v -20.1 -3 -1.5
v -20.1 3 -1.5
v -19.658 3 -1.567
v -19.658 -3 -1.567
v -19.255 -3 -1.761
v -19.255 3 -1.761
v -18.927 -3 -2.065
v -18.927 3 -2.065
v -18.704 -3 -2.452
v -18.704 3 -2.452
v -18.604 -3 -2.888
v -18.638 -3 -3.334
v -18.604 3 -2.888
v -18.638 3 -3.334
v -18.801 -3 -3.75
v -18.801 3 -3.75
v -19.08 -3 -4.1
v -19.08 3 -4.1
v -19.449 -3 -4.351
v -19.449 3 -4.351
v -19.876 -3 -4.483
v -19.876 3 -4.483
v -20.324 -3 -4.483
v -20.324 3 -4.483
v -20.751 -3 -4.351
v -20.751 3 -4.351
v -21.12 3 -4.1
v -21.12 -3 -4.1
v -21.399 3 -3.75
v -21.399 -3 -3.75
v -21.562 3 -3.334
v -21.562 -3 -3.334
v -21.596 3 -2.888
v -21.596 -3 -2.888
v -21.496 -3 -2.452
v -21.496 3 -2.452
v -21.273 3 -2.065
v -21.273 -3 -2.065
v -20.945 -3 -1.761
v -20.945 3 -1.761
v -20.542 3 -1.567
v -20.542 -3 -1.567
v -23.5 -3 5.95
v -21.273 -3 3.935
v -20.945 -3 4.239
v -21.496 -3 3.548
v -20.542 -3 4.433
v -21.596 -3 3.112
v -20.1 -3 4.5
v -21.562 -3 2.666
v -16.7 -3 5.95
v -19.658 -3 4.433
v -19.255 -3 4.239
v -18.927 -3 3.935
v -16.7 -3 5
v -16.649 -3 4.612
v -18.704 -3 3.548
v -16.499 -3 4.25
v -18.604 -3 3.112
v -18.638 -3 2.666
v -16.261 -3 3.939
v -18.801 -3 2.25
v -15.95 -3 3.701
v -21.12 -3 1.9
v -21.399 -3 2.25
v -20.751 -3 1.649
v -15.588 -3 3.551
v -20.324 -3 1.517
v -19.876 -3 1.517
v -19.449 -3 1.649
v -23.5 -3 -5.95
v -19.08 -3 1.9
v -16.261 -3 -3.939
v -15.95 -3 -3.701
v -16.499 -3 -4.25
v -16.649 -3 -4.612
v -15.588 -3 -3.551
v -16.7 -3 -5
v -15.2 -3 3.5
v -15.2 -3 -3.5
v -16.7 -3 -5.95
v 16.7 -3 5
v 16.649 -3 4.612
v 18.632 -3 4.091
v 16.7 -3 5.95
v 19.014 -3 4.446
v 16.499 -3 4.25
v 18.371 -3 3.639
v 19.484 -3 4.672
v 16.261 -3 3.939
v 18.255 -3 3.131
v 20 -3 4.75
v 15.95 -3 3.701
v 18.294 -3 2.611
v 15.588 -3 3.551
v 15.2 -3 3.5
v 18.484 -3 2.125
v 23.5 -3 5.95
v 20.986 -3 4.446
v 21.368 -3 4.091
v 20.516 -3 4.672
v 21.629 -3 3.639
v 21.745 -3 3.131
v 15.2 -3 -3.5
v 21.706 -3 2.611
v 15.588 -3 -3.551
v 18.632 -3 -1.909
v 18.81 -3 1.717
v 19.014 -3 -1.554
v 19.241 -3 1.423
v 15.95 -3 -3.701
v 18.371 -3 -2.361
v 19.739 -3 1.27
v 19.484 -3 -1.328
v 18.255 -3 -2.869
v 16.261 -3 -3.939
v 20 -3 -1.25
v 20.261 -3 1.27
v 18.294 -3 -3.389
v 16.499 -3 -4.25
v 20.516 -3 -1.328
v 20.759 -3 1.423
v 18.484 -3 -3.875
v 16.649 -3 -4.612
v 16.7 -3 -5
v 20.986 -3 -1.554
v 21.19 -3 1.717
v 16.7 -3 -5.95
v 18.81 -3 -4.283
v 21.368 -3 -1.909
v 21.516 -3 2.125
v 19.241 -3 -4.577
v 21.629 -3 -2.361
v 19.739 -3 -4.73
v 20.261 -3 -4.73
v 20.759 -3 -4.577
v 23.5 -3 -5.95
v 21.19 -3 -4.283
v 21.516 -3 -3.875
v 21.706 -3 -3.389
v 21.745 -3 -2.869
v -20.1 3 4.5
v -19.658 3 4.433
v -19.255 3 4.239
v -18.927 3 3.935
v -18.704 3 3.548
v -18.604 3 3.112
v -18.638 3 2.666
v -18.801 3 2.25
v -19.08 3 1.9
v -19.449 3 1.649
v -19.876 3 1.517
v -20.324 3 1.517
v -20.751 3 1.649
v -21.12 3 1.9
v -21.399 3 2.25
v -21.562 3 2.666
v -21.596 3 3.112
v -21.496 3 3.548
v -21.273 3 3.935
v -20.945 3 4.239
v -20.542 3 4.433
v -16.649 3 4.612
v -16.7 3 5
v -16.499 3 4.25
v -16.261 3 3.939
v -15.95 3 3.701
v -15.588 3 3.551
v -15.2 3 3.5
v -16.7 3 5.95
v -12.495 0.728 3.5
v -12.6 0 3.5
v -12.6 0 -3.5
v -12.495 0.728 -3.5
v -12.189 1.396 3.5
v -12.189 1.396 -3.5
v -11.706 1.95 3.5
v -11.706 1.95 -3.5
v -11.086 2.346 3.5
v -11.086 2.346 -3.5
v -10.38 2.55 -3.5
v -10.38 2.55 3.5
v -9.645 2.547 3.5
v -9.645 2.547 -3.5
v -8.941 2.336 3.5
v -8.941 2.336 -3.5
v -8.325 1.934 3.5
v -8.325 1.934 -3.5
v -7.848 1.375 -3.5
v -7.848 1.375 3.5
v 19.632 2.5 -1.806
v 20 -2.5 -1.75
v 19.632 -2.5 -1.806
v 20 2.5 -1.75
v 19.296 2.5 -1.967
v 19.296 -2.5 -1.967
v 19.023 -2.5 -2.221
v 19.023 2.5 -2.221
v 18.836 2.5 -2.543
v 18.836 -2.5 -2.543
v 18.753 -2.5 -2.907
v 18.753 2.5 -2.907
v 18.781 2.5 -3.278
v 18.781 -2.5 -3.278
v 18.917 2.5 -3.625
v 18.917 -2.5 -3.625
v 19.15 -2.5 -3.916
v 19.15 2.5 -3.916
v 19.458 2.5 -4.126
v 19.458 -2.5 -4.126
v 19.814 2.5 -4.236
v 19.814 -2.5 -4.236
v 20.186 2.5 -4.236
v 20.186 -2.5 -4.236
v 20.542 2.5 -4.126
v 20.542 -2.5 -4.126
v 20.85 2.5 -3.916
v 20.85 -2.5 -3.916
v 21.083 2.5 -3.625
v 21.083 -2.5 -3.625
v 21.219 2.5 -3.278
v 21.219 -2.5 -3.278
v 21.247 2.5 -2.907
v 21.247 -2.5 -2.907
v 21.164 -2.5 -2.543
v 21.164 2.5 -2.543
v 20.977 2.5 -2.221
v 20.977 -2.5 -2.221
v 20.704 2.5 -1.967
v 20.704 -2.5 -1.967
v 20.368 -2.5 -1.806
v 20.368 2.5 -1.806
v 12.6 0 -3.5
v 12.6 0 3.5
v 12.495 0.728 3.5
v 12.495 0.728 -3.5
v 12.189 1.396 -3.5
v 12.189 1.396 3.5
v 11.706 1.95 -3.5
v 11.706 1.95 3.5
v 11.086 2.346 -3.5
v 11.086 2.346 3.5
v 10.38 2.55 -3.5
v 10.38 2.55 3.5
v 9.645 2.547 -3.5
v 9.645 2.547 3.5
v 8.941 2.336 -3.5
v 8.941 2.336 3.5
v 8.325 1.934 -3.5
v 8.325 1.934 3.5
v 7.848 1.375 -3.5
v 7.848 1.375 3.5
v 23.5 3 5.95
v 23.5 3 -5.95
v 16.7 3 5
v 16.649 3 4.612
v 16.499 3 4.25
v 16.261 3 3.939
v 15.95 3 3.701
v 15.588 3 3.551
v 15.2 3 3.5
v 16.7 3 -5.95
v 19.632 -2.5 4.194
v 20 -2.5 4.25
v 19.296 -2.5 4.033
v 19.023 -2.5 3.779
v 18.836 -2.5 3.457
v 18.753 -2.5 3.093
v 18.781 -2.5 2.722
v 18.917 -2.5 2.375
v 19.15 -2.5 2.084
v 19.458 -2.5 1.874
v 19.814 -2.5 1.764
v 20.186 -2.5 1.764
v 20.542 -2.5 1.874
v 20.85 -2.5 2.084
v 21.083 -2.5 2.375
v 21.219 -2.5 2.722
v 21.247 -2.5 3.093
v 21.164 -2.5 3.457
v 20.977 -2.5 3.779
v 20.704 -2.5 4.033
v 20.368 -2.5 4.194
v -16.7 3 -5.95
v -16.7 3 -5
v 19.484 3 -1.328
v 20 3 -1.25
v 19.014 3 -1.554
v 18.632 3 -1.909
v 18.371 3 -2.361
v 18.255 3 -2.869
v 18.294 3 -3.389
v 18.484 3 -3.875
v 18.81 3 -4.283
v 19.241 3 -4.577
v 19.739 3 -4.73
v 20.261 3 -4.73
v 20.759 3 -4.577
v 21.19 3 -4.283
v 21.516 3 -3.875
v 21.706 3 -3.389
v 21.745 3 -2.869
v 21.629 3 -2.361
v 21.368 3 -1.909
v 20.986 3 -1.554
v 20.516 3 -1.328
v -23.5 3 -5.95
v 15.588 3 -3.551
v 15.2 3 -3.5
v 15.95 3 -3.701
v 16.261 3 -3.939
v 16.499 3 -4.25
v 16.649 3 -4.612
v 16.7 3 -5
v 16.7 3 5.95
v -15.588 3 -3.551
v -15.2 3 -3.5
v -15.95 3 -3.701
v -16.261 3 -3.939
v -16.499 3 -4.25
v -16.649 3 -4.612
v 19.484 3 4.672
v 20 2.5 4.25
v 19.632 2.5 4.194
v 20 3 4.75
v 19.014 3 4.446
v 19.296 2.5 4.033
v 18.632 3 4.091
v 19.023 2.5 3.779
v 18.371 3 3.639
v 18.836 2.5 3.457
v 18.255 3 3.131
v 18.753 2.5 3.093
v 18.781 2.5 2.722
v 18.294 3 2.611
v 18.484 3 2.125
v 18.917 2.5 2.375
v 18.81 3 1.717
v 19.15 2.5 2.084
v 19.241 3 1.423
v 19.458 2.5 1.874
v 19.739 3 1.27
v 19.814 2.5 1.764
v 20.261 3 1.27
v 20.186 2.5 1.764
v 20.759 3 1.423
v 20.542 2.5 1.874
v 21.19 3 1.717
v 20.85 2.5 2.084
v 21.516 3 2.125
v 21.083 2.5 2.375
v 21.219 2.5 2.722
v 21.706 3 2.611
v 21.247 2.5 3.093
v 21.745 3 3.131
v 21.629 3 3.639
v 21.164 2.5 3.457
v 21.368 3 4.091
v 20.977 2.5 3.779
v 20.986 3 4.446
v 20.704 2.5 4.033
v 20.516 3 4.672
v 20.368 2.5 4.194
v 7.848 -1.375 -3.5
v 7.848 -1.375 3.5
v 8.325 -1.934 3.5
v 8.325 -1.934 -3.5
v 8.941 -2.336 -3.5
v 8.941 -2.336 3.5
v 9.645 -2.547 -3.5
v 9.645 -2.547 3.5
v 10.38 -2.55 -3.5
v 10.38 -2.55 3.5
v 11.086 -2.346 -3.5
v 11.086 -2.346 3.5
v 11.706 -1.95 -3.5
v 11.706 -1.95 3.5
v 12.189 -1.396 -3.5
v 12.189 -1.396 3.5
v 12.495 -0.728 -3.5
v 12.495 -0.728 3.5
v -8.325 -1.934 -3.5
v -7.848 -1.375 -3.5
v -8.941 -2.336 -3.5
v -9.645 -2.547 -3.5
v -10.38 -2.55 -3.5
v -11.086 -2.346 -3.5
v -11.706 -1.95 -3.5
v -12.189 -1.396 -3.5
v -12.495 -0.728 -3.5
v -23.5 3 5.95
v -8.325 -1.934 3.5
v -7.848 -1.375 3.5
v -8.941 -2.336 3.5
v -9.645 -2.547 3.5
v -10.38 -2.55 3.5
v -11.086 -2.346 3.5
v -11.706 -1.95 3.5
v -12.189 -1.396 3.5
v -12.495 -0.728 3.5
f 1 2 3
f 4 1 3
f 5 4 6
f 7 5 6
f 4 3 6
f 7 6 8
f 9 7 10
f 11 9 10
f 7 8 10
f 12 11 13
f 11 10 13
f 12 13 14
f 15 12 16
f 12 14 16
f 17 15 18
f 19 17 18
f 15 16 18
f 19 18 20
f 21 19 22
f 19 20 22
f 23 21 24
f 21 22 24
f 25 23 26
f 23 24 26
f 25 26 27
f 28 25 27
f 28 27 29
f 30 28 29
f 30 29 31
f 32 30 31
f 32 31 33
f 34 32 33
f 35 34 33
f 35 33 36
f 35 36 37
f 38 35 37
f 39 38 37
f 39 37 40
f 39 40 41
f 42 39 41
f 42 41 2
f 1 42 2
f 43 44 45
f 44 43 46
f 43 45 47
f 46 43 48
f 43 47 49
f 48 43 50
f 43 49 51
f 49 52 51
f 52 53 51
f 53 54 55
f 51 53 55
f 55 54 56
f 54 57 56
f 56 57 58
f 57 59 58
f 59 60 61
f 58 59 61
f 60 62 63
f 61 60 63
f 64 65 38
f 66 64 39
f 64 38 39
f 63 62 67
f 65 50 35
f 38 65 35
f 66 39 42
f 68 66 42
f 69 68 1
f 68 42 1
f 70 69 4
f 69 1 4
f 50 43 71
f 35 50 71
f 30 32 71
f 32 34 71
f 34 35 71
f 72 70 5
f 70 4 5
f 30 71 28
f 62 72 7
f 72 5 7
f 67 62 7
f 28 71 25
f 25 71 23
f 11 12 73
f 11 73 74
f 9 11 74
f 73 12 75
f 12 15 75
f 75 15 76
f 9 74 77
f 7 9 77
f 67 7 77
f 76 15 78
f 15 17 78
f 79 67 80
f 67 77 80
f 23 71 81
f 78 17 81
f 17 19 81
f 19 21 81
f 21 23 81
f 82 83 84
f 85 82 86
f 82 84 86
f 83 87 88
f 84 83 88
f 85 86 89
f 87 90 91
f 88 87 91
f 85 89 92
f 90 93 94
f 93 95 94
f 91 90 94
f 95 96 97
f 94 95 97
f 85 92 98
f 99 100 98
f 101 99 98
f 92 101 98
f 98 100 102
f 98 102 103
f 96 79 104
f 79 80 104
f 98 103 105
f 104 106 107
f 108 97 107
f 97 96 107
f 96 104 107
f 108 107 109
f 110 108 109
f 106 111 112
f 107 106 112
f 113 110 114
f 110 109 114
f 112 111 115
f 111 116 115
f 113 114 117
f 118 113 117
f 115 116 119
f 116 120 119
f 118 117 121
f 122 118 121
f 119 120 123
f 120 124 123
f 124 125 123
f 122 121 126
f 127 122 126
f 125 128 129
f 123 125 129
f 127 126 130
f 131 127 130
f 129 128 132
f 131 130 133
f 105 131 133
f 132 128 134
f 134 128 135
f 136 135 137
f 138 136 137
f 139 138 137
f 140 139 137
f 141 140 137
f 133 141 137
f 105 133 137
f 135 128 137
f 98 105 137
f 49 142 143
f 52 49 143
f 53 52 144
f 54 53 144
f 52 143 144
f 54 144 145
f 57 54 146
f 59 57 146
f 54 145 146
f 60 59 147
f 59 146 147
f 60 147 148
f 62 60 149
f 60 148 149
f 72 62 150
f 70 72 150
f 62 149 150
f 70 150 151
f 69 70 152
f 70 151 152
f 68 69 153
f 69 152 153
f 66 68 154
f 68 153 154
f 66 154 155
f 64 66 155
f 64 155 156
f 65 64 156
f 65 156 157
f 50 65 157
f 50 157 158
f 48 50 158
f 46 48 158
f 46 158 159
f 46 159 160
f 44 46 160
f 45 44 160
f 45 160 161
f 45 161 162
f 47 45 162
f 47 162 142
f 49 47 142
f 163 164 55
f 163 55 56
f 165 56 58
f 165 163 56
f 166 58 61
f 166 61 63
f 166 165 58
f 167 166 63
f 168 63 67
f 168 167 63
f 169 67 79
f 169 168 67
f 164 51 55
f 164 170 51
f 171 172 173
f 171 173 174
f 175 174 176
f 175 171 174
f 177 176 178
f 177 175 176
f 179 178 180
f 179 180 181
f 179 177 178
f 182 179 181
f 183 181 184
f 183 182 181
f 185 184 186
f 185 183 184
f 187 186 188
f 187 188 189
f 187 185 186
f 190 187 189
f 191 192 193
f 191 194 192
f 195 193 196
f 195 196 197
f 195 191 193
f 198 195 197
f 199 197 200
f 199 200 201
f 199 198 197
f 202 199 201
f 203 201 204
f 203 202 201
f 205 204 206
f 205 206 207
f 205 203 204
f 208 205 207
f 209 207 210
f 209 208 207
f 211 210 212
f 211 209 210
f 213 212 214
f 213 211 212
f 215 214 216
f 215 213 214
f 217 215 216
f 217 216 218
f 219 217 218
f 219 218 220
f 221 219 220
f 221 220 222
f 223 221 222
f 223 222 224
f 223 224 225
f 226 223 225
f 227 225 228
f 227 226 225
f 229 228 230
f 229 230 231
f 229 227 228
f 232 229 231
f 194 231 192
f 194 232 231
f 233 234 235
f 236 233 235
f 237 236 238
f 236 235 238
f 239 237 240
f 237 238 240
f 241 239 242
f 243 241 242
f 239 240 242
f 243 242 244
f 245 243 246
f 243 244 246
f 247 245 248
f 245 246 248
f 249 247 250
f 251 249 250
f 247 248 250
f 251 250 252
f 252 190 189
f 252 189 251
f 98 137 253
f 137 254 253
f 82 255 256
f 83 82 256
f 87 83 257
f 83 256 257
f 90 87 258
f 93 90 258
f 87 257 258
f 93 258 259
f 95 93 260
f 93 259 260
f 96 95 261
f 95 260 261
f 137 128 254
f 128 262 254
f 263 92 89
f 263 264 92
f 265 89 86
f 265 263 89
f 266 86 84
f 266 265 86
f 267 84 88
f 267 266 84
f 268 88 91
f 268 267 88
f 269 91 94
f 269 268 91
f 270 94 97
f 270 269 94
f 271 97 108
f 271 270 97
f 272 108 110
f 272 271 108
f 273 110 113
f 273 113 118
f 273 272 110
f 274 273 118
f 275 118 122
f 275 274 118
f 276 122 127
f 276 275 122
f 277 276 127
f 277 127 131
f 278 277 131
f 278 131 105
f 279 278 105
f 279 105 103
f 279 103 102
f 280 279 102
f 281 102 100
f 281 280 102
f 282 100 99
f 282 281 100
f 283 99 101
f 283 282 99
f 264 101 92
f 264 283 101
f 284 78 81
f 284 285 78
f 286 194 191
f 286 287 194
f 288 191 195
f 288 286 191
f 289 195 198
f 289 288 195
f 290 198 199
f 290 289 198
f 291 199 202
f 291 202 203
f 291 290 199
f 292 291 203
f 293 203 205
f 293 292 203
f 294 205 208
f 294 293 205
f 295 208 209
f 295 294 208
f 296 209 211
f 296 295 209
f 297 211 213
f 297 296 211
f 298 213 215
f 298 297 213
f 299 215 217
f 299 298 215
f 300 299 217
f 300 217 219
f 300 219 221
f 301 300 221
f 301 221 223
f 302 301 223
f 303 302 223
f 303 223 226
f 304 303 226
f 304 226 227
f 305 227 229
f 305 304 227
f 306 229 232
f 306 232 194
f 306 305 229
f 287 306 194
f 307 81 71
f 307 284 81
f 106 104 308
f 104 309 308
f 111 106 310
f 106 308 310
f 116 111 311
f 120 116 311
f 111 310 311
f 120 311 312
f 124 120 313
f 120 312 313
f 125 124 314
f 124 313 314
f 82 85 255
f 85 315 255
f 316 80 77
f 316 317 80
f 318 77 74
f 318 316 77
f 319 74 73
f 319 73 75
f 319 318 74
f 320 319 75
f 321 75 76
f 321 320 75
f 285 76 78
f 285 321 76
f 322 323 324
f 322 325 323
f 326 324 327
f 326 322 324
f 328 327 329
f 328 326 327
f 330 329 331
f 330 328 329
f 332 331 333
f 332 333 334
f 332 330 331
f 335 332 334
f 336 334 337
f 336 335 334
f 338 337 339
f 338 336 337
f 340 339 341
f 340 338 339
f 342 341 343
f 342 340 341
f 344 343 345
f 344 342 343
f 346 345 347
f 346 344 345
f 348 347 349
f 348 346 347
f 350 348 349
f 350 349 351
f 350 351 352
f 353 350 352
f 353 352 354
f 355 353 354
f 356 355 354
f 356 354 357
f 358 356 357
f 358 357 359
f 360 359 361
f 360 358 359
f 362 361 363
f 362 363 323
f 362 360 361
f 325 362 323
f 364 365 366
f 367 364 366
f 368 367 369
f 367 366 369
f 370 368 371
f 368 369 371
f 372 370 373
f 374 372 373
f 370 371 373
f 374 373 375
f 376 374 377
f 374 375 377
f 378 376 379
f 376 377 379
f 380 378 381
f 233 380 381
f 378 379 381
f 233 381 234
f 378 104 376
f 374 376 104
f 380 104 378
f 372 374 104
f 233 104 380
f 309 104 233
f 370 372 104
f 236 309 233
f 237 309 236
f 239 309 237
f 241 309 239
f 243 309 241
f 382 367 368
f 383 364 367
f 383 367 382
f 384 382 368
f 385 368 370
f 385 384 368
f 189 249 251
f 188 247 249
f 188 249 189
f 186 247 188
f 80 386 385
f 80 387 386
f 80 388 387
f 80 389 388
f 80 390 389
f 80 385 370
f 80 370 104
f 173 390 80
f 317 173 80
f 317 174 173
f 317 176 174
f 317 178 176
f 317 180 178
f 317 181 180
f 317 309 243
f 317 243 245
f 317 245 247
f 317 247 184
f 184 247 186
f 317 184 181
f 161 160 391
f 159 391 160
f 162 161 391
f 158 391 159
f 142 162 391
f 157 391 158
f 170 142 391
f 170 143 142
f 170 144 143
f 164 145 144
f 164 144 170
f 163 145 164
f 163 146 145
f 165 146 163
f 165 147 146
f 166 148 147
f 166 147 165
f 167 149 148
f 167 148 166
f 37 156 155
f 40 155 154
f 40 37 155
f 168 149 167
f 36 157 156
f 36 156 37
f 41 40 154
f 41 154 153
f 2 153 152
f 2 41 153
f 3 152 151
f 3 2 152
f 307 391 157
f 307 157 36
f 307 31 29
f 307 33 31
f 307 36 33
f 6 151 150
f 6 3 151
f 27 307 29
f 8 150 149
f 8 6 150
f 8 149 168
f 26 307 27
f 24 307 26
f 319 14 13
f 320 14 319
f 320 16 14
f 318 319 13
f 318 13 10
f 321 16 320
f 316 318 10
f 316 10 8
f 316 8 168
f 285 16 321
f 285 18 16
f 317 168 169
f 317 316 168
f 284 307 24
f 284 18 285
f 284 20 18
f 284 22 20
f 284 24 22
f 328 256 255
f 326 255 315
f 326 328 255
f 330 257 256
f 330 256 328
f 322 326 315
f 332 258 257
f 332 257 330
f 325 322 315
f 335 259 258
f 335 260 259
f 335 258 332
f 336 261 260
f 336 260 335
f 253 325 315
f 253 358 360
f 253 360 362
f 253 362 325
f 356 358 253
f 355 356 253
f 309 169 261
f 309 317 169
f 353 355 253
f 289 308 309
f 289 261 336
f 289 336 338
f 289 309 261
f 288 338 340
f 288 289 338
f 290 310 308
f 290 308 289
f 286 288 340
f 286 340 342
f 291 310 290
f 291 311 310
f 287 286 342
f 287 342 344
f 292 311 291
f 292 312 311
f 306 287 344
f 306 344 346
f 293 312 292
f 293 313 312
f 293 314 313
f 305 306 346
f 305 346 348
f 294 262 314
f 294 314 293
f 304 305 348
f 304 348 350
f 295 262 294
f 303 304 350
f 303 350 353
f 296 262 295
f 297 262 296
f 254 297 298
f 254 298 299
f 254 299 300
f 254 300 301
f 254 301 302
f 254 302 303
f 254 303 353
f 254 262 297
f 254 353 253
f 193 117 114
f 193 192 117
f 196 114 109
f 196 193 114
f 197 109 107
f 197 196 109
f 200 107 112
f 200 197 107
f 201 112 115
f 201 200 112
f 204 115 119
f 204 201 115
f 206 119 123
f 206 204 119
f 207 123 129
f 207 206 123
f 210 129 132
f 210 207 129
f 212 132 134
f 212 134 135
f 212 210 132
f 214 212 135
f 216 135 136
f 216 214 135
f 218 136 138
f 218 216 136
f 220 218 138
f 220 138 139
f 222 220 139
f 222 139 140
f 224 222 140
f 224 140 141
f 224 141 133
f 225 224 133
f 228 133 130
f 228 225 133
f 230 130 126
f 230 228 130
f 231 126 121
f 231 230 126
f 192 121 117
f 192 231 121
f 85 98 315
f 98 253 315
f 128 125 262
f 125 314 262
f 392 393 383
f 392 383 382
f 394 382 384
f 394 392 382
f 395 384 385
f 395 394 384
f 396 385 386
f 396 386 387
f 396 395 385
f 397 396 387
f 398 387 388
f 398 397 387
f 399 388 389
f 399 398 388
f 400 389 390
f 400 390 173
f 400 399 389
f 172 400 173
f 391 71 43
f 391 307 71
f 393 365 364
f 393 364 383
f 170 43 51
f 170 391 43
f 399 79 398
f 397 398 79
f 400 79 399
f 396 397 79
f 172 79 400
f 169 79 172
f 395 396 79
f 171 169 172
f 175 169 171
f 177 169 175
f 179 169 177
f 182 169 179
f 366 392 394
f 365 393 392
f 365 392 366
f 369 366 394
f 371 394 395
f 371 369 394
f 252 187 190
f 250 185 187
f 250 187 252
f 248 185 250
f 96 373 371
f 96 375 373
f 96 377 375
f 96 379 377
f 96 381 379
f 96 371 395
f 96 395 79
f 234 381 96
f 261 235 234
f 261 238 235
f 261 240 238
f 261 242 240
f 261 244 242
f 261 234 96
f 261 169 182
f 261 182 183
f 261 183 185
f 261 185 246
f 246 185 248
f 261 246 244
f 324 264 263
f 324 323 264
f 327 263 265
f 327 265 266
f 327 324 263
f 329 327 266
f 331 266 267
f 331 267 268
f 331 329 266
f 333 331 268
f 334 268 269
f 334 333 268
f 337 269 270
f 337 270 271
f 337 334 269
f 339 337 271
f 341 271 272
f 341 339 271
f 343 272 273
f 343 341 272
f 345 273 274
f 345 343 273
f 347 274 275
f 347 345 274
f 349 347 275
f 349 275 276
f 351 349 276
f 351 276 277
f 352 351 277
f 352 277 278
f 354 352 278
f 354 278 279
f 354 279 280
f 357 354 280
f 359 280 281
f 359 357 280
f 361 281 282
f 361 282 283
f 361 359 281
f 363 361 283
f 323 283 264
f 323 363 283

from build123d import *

# Parameters (mm, degrees)
BOSS_EXTRUDE1_DEPTH        = 3
CUT_EXTRUDE1_DEPTH         = 26.505930683
M3_TAPPED_HOLE1_AT_2_COUNT = 2
M3_TAPPED_HOLE1_AT_2_PITCH = 6
SKETCH6_R                  = 1.5
CUT_EXTRUDE2_DEPTH         = 25.973035458


with BuildPart() as part:
    # Sketch1 → Boss-Extrude1 (new, symmetric)
    with BuildSketch(Plane(origin=(0, 0, 0), x_dir=(1, 0, 0), z_dir=(0, 1, 0))):
        with BuildLine():
            Line((0, -3.5), (0, 3.5))
            Line((0, 3.5), (15.2, 3.5))
            ThreePointArc((15.2, 3.5), (16.260660172, 3.939339828), (16.7, 5))
            Line((16.7, 5), (16.7, 5.95))
            Line((16.7, 5.95), (23.5, 5.95))
            Line((23.5, 5.95), (23.5, -5.95))
            Line((23.5, -5.95), (16.7, -5.95))
            Line((16.7, -5.95), (16.7, -5))
            ThreePointArc((16.7, -5), (16.260660172, -3.939339828), (15.2, -3.5))
            Line((15.2, -3.5), (0, -3.5))
        make_face()
    extrude(amount=BOSS_EXTRUDE1_DEPTH, both=True)

    # Sketch2 → Cut-Extrude1 (cut, through all)
    with BuildSketch(Plane.XY.offset(3.5)):
        with BuildLine():
            ThreePointArc((7.847845894, 1.375), (7.45, 0), (7.847845894, -1.375))
            Line((7.847845894, -1.375), (10.025, -1.375))
            Line((10.025, -1.375), (10.025, 1.375))
            Line((10.025, 1.375), (7.847845894, 1.375))
        make_face()
        with BuildLine():
            Line((10.025, -1.375), (7.847845894, -1.375))
            ThreePointArc((7.847845894, -1.375), (10.740700069, -2.473539652), (12.6, 0))
            ThreePointArc((12.6, 0), (10.740700069, 2.473539652), (7.847845894, 1.375))
            Line((7.847845894, 1.375), (10.025, 1.375))
            Line((10.025, 1.375), (10.025, -1.375))
        make_face()
        with BuildLine():
            Line((0, 1.375), (0, -1.375))
            Line((0, -1.375), (7.847845894, -1.375))
            ThreePointArc((7.847845894, -1.375), (7.45, 0), (7.847845894, 1.375))
            Line((7.847845894, 1.375), (0, 1.375))
        make_face()
    extrude(amount=-CUT_EXTRUDE1_DEPTH, mode=Mode.SUBTRACT)

    # Mirror1: part across plane


with BuildPart() as part_1:
    add(part.part)
    add(part.part.mirror(Plane(origin=(0, 0, 0), x_dir=(0, 0, 1), z_dir=(1, 0, 0))))

    # Sketch5 → M3 Tapped Hole1 (revolve, cut)
    with BuildSketch(Plane(origin=(20, 3, -3), x_dir=(0, 0, 1), z_dir=(1, 0, 0))):
        Polygon((0, 0), (0, 6), (1.75, 6), (1.25, 5.5), (1.25, 0.5), (1.75, 0), align=None)
    m3_tapped_hole1 = revolve(axis=Axis((20, 9.35, -3), (0, -1, 0)), mode=Mode.SUBTRACT)

    # M3 Tapped Hole1 at 2: M3 Tapped Hole1 ×2
    with Locations(*[(0, 0, i * M3_TAPPED_HOLE1_AT_2_PITCH) for i in range(1, M3_TAPPED_HOLE1_AT_2_COUNT)]):
        add(m3_tapped_hole1, mode=Mode.SUBTRACT)

    # Sketch6 → Cut-Extrude2 (cut, through all)
    with BuildSketch(Plane(origin=(0, 3, 0), x_dir=(1, 0, 0), z_dir=(0, 1, 0))):
        with Locations(Location((-20.1, 3, 0), (0, 0, 270))):
            Circle(SKETCH6_R)
        with Locations(Location((-20.1, -3, 0), (0, 0, 270))):
            Circle(SKETCH6_R)
    extrude(amount=-CUT_EXTRUDE2_DEPTH, mode=Mode.SUBTRACT)


solid = part_1.part
